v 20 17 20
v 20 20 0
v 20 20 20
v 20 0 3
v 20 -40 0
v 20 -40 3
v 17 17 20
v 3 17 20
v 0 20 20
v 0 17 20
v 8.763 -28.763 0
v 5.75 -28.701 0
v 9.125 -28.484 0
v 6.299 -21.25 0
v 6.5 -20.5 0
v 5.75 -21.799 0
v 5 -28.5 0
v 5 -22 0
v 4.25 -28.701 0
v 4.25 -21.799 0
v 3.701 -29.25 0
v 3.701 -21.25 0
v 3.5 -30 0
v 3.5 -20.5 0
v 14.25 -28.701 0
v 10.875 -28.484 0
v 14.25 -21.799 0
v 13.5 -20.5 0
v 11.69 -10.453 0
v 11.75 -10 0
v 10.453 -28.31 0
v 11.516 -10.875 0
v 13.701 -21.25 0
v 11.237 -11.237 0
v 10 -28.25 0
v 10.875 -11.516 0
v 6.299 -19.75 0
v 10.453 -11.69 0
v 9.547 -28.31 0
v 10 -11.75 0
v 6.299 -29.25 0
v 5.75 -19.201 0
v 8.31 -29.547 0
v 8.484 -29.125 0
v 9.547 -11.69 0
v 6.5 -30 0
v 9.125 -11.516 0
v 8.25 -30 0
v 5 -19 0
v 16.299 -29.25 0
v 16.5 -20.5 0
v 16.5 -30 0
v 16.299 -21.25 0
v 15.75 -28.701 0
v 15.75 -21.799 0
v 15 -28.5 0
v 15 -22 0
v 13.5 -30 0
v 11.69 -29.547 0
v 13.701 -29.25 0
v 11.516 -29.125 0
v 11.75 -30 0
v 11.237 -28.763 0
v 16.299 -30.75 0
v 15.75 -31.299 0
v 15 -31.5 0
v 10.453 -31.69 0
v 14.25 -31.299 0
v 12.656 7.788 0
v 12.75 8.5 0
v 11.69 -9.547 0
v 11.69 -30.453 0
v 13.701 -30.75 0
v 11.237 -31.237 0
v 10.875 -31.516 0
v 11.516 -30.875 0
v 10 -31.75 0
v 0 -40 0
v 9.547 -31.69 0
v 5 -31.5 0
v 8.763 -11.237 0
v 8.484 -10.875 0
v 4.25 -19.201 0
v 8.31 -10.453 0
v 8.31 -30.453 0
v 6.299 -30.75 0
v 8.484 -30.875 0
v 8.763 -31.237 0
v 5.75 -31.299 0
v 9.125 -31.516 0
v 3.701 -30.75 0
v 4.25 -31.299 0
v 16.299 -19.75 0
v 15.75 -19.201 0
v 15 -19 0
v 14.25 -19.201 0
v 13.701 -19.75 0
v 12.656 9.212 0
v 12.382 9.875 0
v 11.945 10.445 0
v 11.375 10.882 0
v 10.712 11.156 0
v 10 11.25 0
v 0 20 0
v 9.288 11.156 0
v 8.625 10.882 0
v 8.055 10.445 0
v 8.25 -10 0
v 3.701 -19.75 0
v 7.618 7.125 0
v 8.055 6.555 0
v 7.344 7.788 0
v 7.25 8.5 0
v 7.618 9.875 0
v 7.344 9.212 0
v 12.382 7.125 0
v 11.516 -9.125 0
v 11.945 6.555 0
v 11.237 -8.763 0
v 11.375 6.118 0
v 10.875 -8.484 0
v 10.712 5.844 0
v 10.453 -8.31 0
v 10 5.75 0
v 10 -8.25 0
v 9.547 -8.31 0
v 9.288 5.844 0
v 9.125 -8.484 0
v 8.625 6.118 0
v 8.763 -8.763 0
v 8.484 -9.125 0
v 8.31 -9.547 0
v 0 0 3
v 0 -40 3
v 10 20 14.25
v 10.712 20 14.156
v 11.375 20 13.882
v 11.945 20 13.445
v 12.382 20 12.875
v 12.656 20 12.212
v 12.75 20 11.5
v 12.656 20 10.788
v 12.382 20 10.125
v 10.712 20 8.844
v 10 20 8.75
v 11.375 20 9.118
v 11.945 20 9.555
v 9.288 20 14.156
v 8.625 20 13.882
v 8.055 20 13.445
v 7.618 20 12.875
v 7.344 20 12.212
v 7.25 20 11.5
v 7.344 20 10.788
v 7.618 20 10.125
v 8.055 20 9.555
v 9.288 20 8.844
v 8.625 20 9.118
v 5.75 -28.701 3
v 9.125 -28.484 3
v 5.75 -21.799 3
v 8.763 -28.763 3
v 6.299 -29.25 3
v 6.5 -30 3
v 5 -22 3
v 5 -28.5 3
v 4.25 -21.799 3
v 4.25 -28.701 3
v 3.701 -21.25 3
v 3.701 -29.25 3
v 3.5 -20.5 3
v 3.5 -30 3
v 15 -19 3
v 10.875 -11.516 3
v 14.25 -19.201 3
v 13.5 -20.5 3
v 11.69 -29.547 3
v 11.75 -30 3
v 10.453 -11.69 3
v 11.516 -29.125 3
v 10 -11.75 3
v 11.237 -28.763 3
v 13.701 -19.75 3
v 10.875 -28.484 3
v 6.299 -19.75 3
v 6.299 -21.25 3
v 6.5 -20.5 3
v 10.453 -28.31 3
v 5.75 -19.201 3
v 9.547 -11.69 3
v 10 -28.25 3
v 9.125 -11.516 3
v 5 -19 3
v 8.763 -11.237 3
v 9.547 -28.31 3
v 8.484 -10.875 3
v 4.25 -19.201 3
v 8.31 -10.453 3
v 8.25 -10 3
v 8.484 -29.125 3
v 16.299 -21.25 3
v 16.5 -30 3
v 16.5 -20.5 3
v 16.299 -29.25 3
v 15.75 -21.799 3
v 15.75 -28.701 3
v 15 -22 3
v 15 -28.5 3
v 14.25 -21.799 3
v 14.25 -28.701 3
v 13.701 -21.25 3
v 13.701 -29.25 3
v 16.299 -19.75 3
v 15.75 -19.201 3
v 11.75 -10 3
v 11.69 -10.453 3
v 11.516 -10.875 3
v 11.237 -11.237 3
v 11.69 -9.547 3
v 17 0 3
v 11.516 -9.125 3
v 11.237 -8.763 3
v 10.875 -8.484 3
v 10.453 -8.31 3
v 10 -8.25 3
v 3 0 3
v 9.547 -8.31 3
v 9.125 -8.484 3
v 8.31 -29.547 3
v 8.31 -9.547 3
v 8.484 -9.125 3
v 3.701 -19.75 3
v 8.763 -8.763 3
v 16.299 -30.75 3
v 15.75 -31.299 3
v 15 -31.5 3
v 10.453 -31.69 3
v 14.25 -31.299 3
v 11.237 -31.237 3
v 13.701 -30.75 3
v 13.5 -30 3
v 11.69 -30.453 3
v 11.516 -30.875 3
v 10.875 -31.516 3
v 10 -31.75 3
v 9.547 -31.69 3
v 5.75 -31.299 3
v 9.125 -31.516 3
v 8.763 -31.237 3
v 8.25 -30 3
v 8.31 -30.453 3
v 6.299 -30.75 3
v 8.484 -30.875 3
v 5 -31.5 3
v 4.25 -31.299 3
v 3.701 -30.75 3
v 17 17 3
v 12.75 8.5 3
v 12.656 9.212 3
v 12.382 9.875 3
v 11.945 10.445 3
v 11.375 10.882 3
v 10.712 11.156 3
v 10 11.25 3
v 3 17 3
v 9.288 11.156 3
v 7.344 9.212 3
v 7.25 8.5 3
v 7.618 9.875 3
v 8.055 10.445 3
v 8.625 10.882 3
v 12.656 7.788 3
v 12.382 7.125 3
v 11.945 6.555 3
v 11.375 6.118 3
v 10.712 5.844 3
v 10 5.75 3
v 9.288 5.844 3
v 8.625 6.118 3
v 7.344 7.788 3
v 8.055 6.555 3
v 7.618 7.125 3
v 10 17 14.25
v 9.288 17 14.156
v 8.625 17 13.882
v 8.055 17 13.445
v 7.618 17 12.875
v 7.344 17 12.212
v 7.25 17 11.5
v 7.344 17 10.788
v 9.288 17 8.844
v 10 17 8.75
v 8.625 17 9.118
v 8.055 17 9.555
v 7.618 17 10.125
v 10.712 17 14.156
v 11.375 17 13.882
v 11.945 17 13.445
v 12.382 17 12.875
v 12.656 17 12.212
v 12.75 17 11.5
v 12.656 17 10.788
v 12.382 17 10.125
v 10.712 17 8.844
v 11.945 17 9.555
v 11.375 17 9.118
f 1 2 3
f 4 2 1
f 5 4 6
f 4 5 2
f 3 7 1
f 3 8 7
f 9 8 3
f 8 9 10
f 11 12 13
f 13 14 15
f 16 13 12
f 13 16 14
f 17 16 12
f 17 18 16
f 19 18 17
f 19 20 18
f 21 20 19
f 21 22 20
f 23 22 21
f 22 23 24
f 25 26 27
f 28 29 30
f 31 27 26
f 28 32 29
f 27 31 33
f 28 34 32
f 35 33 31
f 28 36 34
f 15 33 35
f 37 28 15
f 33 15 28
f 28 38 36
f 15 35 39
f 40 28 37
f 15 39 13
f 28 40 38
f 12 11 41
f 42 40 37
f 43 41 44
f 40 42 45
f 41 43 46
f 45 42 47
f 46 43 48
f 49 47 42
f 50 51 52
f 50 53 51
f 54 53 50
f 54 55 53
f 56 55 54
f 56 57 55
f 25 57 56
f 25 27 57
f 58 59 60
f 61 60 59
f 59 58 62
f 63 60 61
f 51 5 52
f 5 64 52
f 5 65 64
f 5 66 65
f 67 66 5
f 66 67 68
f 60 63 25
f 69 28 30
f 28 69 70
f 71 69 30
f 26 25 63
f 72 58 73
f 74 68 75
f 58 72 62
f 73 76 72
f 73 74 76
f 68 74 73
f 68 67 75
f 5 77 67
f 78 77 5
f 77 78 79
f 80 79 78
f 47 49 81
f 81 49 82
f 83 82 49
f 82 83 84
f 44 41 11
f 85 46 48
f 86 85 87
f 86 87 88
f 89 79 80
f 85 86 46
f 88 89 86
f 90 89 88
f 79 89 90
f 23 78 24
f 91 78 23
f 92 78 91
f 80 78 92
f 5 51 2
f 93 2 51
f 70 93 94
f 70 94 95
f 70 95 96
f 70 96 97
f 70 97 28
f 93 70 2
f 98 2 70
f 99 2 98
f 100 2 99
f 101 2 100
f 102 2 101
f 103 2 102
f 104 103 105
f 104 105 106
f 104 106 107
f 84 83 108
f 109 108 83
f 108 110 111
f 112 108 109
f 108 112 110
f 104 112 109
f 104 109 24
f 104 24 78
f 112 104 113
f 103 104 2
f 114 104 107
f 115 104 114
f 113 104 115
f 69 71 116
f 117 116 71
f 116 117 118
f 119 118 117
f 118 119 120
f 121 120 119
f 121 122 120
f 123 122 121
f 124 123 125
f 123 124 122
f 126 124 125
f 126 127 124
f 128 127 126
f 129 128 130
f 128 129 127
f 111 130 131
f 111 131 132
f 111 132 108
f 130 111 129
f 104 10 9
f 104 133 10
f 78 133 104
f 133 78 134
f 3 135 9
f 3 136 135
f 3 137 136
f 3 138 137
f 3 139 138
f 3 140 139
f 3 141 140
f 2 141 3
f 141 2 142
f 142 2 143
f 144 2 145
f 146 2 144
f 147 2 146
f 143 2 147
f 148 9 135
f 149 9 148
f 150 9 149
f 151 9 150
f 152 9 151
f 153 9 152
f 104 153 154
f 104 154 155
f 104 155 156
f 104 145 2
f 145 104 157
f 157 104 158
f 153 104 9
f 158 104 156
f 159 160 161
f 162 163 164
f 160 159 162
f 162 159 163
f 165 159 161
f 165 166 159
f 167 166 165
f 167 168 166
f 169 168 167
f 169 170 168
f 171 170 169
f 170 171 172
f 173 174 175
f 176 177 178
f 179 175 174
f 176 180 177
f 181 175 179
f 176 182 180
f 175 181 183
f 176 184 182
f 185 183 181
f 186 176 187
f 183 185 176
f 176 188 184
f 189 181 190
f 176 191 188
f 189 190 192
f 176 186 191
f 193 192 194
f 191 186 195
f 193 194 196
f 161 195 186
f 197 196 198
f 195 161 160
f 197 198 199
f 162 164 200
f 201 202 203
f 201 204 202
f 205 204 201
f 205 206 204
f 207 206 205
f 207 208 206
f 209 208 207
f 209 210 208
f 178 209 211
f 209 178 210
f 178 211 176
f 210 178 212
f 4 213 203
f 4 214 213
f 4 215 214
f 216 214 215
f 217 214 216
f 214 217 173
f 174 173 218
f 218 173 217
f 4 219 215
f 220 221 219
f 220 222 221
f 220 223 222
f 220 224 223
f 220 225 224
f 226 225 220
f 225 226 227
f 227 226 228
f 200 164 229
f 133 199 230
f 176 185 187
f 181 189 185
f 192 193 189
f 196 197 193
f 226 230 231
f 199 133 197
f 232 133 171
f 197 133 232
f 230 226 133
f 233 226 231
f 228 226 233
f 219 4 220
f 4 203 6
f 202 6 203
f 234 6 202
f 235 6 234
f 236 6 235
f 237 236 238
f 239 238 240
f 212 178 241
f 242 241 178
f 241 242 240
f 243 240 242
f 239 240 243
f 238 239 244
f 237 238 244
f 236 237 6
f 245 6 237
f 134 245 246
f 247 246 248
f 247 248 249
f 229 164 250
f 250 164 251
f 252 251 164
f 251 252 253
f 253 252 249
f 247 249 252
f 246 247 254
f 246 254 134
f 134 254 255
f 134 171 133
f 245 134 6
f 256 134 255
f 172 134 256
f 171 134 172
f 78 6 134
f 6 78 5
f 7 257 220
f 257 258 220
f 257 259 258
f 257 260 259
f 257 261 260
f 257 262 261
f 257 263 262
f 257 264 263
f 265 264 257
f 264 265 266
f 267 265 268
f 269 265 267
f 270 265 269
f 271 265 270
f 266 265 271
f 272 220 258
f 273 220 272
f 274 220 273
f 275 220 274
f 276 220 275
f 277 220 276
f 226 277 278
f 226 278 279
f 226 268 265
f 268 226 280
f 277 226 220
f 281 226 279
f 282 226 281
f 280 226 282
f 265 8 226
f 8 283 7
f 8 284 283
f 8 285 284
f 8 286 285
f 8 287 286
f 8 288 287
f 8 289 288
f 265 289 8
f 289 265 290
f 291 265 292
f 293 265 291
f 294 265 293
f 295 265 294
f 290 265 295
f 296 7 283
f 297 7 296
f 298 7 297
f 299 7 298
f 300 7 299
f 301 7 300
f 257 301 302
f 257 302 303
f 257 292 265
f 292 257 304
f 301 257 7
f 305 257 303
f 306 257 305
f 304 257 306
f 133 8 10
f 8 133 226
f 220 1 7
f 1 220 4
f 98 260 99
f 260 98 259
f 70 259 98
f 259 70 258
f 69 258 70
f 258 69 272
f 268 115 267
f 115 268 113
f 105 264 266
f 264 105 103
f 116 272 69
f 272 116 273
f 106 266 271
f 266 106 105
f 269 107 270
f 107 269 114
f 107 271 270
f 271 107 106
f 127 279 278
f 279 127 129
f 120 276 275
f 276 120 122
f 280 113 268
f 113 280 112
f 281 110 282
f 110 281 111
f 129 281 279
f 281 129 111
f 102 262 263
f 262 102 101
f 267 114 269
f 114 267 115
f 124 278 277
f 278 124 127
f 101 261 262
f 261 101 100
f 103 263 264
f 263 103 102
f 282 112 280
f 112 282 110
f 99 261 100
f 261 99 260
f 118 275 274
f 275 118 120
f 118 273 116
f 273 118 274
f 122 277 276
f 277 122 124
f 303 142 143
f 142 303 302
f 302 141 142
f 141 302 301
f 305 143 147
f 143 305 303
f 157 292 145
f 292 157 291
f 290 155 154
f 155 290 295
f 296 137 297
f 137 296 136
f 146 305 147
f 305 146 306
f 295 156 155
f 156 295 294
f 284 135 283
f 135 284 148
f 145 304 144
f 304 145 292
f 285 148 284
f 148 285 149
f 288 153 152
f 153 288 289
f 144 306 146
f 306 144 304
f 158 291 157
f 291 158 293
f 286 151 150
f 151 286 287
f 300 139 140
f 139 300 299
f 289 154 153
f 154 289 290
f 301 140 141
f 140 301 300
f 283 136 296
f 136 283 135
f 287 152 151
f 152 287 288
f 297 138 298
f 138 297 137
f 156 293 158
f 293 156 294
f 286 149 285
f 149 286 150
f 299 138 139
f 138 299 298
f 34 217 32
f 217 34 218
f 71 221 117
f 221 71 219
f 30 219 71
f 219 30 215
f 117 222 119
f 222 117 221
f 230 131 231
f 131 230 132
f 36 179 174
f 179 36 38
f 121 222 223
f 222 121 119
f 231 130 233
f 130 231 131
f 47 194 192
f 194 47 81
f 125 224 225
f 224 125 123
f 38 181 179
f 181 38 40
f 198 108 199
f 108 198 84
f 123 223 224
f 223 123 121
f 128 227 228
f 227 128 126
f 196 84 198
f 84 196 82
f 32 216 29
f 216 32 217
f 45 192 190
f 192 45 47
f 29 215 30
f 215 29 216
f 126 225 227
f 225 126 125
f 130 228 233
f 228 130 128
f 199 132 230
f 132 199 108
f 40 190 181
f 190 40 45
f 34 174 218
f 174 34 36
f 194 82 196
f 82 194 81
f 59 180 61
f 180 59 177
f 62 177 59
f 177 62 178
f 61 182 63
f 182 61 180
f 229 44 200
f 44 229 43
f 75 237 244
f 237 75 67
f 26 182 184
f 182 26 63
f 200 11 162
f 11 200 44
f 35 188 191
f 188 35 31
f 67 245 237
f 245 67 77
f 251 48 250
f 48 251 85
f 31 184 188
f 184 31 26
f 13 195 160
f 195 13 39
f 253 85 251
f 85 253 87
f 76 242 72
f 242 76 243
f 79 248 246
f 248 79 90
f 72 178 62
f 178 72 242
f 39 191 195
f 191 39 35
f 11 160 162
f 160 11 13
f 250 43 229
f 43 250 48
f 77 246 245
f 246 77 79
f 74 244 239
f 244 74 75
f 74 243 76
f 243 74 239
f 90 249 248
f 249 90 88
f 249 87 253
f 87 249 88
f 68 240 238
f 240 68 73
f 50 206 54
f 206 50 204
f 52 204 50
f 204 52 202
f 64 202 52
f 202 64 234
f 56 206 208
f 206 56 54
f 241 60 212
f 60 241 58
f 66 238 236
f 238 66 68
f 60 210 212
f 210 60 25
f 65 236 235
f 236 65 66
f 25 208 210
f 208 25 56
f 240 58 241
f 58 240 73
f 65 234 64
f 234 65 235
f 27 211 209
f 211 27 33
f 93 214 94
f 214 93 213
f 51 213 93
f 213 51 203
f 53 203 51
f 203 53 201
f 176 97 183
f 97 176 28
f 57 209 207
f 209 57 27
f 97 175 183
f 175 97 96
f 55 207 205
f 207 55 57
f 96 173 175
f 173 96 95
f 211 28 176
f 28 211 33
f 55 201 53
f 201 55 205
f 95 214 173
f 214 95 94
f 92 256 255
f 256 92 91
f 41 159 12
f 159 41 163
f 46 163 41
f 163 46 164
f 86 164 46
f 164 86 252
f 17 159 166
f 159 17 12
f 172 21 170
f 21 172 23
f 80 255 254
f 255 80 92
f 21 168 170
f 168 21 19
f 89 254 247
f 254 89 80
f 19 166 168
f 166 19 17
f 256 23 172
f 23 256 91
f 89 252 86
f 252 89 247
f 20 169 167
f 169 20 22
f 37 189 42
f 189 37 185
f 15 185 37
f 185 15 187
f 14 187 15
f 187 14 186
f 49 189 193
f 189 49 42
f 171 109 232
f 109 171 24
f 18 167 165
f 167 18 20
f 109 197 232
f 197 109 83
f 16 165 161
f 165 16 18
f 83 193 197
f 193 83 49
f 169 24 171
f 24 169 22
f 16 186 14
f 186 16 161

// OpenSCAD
difference()
{
    union()
    {
        translate([0,0,0])
            cube([20,20,20]);
        translate([0,-40,0])
            cube([20,40,3]);
    }
    union()
    {
        translate([3,0,3])
            cube([14,17,17]);
        
        translate([0,0,3])
            rotate([45,0,0])
                cube([20,30,20]);
        
        translate([10,17/2,0])
            cylinder(d=5.5,h=3,$fn=24);
        
        translate([10,17,3+17/2])
            rotate([270,0,0])
                cylinder(d=5.5,h=3,$fn=24);
        
        translate([10,-10,0])
            cylinder(d=3.5,h=4,$fn=24);
        
        translate([10,-10-20,0])
            cylinder(d=3.5,h=4,$fn=24);
        
        
        translate([20-5,-40+10,0])
            cylinder(d=3,h=4,$fn=12);
        translate([20-5,-40+10+9.5,0])
            cylinder(d=3,h=4,$fn=12);
            
        translate([5,-40+10,0])
            cylinder(d=3,h=4,$fn=12);
        translate([5,-40+10+9.5,0])
            cylinder(d=3,h=4,$fn=12);
    }
    
}
